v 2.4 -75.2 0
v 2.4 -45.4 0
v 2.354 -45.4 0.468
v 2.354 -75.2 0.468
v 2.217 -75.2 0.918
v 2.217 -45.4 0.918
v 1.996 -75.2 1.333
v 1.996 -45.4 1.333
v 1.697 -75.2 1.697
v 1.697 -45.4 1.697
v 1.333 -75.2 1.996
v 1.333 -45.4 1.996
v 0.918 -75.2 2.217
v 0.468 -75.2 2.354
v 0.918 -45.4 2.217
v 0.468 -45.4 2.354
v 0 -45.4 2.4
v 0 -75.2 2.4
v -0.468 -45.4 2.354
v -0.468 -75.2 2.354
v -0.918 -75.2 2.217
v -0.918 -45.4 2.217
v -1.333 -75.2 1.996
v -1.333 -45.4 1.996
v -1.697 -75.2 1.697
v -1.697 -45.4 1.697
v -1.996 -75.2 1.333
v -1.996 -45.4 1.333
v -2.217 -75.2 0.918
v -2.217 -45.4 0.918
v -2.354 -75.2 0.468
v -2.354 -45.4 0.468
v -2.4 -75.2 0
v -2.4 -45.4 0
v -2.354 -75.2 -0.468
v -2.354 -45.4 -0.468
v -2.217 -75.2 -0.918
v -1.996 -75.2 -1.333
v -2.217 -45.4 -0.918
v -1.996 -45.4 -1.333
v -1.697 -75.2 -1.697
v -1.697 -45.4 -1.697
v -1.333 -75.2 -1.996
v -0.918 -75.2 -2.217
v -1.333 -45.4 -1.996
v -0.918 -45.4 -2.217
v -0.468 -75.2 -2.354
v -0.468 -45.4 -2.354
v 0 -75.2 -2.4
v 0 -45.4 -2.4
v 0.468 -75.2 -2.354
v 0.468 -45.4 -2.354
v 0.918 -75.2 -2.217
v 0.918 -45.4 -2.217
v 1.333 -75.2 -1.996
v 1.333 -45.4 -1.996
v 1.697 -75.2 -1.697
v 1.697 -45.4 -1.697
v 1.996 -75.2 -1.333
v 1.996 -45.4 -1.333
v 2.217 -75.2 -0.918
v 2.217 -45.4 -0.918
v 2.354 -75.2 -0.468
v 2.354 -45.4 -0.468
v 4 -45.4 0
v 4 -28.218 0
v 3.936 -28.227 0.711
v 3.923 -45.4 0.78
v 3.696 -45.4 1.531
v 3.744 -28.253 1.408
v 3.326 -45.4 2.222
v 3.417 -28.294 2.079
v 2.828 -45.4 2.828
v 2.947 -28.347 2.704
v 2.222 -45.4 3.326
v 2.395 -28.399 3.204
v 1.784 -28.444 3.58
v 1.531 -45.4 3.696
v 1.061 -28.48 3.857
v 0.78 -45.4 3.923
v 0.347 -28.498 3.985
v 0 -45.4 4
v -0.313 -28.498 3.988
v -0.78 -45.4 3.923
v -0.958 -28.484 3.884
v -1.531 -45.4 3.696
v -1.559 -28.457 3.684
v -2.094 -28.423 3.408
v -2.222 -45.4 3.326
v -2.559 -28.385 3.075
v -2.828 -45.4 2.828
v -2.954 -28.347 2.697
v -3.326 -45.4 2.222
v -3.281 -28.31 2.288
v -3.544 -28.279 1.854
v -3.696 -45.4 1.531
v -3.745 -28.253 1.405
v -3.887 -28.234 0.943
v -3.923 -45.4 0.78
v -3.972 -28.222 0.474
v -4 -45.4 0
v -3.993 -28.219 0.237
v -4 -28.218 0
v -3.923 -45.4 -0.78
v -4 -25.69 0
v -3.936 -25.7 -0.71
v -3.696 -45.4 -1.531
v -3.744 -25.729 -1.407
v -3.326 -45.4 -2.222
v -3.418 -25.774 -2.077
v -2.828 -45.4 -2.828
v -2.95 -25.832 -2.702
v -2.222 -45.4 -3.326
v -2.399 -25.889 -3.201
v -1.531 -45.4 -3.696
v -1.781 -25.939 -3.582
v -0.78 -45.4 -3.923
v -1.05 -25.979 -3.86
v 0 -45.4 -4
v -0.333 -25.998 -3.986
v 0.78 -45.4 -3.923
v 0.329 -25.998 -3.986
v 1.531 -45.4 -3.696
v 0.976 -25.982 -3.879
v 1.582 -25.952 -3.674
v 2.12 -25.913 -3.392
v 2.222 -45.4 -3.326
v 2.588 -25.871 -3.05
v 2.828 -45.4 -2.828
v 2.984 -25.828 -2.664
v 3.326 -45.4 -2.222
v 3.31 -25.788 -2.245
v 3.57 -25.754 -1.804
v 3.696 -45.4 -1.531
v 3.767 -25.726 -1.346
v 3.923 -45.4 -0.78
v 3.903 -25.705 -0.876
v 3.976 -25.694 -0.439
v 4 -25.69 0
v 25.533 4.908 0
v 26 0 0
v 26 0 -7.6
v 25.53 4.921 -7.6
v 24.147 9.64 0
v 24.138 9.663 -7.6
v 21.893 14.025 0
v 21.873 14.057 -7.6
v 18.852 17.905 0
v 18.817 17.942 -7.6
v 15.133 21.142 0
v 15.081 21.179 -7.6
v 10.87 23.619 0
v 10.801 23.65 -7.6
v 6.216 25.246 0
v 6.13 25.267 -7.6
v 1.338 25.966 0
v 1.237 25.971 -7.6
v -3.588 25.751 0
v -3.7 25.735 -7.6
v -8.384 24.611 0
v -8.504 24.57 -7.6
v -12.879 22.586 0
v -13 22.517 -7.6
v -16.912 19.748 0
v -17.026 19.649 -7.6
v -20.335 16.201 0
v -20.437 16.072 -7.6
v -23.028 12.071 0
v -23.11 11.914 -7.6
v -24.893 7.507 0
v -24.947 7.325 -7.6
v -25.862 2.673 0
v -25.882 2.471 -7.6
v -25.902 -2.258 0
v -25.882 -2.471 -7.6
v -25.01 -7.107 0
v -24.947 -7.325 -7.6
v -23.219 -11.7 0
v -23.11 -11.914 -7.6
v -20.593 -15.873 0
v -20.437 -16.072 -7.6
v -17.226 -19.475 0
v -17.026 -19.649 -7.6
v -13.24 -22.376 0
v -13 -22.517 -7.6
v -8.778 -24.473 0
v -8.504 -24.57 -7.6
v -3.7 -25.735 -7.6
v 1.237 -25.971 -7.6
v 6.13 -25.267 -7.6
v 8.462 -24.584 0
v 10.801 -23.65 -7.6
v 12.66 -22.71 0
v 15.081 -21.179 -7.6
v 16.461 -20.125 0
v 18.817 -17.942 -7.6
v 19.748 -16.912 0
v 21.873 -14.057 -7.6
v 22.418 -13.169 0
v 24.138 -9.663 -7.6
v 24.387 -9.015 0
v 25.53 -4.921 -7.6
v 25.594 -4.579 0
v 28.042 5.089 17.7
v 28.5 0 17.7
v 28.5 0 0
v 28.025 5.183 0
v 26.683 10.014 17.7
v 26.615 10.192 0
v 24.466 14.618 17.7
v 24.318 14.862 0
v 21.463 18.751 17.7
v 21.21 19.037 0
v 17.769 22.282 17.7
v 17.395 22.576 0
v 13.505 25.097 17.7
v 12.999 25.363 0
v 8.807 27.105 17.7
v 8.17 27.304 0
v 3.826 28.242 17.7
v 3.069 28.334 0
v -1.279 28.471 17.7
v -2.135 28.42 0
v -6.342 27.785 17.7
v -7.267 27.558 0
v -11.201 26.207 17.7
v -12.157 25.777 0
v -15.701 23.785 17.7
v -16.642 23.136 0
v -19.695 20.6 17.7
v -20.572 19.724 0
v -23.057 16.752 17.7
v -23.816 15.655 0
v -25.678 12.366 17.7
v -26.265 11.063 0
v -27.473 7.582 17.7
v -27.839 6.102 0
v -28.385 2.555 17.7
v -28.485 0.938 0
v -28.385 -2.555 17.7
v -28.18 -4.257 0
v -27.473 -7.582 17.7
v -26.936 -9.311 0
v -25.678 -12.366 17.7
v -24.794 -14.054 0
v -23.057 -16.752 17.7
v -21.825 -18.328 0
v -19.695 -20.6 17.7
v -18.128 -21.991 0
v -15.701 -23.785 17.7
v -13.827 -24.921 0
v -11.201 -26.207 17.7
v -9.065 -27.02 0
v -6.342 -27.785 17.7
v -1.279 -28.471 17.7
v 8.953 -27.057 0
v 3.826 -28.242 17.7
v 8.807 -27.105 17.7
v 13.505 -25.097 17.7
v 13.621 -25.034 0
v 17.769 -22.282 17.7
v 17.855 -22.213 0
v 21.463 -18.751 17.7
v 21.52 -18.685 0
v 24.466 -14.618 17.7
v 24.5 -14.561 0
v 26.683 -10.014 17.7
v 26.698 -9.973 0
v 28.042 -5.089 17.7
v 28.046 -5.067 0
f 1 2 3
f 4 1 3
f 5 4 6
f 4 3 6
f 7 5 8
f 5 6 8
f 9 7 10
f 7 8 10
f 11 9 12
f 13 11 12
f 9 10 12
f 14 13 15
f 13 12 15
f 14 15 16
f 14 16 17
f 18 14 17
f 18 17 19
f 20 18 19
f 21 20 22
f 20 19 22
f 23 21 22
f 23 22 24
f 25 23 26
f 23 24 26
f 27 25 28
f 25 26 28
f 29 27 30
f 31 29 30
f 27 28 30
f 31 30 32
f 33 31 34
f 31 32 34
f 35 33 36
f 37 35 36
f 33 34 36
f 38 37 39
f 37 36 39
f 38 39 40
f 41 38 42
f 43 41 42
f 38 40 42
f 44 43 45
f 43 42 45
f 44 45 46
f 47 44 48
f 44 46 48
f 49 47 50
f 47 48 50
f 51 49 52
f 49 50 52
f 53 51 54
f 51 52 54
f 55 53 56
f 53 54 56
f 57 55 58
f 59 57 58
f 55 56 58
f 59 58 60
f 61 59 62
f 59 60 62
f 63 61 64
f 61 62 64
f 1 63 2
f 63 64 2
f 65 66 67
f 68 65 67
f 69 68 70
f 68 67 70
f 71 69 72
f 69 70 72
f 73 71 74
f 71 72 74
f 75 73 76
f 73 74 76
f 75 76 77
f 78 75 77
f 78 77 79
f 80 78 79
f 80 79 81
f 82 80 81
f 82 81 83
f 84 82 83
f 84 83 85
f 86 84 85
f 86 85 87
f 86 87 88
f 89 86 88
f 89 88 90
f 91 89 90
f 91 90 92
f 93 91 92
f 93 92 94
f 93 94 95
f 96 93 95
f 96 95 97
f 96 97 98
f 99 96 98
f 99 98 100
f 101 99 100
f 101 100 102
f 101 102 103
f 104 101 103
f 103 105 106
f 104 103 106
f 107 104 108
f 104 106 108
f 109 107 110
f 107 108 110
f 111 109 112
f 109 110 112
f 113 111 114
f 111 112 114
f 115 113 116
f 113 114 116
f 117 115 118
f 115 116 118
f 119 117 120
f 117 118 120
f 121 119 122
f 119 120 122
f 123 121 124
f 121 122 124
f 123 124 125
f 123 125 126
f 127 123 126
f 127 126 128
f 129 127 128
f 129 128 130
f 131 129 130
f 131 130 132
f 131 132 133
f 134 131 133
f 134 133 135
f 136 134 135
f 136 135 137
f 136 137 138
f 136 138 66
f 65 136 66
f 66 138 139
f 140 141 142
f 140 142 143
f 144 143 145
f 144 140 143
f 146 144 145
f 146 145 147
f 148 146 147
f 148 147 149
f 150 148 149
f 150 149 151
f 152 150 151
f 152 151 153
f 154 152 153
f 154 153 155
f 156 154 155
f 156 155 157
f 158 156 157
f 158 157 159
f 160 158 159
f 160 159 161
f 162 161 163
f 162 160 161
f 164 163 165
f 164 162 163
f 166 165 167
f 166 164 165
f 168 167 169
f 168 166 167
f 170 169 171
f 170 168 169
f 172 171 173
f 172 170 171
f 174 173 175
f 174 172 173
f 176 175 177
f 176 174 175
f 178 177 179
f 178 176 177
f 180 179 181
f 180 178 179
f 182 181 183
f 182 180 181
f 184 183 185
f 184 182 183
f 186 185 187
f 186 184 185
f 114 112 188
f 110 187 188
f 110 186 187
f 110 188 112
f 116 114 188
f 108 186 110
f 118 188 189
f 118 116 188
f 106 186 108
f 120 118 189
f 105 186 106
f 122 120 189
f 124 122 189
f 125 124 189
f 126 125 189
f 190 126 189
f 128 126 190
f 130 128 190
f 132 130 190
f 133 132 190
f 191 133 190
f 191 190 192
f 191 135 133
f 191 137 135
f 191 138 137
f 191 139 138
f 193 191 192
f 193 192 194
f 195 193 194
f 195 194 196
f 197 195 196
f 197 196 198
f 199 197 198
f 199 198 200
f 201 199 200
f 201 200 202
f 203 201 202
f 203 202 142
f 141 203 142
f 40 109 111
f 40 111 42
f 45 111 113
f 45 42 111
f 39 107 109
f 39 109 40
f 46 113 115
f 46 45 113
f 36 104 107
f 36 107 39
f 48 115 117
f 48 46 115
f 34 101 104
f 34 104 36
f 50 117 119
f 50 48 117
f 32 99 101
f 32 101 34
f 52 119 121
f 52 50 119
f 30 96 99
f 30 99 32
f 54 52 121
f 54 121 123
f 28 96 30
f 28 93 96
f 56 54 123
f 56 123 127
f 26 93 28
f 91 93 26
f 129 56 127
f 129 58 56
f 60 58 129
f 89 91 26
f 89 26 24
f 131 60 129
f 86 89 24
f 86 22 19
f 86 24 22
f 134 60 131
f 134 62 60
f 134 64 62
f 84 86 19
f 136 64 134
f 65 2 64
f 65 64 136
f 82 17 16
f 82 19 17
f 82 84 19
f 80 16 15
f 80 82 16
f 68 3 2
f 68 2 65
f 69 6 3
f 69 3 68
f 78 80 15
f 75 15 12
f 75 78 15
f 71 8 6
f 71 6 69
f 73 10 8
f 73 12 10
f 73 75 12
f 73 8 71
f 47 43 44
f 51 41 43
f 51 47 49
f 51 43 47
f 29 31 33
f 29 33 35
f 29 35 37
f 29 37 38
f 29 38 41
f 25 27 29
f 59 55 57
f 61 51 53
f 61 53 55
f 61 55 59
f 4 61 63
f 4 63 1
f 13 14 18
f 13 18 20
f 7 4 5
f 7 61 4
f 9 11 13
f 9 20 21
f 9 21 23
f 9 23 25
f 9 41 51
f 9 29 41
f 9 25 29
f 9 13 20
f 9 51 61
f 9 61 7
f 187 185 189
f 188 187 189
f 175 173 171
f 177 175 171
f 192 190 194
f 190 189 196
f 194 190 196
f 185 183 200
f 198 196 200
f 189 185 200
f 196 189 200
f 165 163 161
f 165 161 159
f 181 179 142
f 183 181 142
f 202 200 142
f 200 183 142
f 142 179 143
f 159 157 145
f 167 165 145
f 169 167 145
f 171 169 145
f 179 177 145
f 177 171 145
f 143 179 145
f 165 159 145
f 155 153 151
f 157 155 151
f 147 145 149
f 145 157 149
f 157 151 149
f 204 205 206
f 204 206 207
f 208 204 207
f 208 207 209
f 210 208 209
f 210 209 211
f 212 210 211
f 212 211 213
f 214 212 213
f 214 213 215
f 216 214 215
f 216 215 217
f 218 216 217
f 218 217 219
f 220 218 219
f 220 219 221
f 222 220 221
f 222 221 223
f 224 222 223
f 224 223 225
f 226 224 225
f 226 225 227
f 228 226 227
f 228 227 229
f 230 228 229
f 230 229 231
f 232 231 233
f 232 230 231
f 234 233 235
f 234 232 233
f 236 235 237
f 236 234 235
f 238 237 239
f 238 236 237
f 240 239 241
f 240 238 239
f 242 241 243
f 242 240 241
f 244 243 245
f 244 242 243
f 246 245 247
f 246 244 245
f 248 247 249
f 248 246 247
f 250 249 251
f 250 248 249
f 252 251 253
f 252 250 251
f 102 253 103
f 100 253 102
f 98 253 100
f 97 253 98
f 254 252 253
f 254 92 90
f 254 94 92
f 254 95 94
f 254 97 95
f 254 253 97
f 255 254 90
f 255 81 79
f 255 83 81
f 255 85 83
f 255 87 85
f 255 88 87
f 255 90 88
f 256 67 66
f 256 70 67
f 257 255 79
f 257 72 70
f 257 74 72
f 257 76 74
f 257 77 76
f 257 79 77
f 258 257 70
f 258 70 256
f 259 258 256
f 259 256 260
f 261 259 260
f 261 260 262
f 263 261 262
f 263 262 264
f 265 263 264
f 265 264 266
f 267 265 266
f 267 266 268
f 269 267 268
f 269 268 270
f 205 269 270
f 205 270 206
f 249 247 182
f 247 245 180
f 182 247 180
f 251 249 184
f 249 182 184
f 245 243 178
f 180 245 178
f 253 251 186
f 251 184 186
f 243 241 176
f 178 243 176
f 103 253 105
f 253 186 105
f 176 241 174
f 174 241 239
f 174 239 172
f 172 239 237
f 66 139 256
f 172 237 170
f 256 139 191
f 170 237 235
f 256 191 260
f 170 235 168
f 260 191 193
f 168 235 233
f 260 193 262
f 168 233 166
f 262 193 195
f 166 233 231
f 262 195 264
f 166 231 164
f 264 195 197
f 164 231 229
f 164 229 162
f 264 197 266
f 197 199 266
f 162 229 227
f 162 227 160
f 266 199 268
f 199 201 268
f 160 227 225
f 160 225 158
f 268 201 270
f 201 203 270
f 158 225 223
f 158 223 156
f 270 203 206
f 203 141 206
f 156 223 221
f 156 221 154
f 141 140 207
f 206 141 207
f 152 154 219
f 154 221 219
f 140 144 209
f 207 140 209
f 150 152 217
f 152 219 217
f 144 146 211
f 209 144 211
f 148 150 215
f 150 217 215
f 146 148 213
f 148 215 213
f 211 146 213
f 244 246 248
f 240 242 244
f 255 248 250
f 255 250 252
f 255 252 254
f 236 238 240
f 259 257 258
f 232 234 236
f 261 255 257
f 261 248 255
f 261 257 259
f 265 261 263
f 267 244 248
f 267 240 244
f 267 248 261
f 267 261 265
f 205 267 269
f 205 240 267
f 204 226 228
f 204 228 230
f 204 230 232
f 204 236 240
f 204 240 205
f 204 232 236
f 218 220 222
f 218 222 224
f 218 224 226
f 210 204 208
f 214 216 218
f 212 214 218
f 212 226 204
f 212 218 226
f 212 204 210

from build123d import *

# Parameters (mm, degrees)
F0_R      = 26
F1_DEPTH  = 7.6
F3_R      = 28.5
F4_DEPTH  = 17.7
F6_R      = 4
F7_DEPTH  = 45.4
F9_R      = 2.4
F10_DEPTH = 29.8


with BuildPart() as f1:
    # F0 (on Top) → F1 (new body)
    with BuildSketch(Plane.XY):
        Circle(F0_R)
    extrude(amount=-F1_DEPTH)

    # F3 (on offset) → F4 (join, through all)
    with BuildSketch(Plane.XY.offset(17.7)):
        Circle(F3_R)
    extrude(amount=-F4_DEPTH)

    # F6 (on Front) → F7 (join, through all)
    with BuildSketch(Plane.XZ):
        Circle(F6_R)
    extrude(amount=F7_DEPTH)

    # F9 (on face) → F10 (join, through all)
    with BuildSketch(Plane.XZ.offset(45.4)):
        Circle(F9_R)
    extrude(amount=F10_DEPTH)


solid = f1.part
